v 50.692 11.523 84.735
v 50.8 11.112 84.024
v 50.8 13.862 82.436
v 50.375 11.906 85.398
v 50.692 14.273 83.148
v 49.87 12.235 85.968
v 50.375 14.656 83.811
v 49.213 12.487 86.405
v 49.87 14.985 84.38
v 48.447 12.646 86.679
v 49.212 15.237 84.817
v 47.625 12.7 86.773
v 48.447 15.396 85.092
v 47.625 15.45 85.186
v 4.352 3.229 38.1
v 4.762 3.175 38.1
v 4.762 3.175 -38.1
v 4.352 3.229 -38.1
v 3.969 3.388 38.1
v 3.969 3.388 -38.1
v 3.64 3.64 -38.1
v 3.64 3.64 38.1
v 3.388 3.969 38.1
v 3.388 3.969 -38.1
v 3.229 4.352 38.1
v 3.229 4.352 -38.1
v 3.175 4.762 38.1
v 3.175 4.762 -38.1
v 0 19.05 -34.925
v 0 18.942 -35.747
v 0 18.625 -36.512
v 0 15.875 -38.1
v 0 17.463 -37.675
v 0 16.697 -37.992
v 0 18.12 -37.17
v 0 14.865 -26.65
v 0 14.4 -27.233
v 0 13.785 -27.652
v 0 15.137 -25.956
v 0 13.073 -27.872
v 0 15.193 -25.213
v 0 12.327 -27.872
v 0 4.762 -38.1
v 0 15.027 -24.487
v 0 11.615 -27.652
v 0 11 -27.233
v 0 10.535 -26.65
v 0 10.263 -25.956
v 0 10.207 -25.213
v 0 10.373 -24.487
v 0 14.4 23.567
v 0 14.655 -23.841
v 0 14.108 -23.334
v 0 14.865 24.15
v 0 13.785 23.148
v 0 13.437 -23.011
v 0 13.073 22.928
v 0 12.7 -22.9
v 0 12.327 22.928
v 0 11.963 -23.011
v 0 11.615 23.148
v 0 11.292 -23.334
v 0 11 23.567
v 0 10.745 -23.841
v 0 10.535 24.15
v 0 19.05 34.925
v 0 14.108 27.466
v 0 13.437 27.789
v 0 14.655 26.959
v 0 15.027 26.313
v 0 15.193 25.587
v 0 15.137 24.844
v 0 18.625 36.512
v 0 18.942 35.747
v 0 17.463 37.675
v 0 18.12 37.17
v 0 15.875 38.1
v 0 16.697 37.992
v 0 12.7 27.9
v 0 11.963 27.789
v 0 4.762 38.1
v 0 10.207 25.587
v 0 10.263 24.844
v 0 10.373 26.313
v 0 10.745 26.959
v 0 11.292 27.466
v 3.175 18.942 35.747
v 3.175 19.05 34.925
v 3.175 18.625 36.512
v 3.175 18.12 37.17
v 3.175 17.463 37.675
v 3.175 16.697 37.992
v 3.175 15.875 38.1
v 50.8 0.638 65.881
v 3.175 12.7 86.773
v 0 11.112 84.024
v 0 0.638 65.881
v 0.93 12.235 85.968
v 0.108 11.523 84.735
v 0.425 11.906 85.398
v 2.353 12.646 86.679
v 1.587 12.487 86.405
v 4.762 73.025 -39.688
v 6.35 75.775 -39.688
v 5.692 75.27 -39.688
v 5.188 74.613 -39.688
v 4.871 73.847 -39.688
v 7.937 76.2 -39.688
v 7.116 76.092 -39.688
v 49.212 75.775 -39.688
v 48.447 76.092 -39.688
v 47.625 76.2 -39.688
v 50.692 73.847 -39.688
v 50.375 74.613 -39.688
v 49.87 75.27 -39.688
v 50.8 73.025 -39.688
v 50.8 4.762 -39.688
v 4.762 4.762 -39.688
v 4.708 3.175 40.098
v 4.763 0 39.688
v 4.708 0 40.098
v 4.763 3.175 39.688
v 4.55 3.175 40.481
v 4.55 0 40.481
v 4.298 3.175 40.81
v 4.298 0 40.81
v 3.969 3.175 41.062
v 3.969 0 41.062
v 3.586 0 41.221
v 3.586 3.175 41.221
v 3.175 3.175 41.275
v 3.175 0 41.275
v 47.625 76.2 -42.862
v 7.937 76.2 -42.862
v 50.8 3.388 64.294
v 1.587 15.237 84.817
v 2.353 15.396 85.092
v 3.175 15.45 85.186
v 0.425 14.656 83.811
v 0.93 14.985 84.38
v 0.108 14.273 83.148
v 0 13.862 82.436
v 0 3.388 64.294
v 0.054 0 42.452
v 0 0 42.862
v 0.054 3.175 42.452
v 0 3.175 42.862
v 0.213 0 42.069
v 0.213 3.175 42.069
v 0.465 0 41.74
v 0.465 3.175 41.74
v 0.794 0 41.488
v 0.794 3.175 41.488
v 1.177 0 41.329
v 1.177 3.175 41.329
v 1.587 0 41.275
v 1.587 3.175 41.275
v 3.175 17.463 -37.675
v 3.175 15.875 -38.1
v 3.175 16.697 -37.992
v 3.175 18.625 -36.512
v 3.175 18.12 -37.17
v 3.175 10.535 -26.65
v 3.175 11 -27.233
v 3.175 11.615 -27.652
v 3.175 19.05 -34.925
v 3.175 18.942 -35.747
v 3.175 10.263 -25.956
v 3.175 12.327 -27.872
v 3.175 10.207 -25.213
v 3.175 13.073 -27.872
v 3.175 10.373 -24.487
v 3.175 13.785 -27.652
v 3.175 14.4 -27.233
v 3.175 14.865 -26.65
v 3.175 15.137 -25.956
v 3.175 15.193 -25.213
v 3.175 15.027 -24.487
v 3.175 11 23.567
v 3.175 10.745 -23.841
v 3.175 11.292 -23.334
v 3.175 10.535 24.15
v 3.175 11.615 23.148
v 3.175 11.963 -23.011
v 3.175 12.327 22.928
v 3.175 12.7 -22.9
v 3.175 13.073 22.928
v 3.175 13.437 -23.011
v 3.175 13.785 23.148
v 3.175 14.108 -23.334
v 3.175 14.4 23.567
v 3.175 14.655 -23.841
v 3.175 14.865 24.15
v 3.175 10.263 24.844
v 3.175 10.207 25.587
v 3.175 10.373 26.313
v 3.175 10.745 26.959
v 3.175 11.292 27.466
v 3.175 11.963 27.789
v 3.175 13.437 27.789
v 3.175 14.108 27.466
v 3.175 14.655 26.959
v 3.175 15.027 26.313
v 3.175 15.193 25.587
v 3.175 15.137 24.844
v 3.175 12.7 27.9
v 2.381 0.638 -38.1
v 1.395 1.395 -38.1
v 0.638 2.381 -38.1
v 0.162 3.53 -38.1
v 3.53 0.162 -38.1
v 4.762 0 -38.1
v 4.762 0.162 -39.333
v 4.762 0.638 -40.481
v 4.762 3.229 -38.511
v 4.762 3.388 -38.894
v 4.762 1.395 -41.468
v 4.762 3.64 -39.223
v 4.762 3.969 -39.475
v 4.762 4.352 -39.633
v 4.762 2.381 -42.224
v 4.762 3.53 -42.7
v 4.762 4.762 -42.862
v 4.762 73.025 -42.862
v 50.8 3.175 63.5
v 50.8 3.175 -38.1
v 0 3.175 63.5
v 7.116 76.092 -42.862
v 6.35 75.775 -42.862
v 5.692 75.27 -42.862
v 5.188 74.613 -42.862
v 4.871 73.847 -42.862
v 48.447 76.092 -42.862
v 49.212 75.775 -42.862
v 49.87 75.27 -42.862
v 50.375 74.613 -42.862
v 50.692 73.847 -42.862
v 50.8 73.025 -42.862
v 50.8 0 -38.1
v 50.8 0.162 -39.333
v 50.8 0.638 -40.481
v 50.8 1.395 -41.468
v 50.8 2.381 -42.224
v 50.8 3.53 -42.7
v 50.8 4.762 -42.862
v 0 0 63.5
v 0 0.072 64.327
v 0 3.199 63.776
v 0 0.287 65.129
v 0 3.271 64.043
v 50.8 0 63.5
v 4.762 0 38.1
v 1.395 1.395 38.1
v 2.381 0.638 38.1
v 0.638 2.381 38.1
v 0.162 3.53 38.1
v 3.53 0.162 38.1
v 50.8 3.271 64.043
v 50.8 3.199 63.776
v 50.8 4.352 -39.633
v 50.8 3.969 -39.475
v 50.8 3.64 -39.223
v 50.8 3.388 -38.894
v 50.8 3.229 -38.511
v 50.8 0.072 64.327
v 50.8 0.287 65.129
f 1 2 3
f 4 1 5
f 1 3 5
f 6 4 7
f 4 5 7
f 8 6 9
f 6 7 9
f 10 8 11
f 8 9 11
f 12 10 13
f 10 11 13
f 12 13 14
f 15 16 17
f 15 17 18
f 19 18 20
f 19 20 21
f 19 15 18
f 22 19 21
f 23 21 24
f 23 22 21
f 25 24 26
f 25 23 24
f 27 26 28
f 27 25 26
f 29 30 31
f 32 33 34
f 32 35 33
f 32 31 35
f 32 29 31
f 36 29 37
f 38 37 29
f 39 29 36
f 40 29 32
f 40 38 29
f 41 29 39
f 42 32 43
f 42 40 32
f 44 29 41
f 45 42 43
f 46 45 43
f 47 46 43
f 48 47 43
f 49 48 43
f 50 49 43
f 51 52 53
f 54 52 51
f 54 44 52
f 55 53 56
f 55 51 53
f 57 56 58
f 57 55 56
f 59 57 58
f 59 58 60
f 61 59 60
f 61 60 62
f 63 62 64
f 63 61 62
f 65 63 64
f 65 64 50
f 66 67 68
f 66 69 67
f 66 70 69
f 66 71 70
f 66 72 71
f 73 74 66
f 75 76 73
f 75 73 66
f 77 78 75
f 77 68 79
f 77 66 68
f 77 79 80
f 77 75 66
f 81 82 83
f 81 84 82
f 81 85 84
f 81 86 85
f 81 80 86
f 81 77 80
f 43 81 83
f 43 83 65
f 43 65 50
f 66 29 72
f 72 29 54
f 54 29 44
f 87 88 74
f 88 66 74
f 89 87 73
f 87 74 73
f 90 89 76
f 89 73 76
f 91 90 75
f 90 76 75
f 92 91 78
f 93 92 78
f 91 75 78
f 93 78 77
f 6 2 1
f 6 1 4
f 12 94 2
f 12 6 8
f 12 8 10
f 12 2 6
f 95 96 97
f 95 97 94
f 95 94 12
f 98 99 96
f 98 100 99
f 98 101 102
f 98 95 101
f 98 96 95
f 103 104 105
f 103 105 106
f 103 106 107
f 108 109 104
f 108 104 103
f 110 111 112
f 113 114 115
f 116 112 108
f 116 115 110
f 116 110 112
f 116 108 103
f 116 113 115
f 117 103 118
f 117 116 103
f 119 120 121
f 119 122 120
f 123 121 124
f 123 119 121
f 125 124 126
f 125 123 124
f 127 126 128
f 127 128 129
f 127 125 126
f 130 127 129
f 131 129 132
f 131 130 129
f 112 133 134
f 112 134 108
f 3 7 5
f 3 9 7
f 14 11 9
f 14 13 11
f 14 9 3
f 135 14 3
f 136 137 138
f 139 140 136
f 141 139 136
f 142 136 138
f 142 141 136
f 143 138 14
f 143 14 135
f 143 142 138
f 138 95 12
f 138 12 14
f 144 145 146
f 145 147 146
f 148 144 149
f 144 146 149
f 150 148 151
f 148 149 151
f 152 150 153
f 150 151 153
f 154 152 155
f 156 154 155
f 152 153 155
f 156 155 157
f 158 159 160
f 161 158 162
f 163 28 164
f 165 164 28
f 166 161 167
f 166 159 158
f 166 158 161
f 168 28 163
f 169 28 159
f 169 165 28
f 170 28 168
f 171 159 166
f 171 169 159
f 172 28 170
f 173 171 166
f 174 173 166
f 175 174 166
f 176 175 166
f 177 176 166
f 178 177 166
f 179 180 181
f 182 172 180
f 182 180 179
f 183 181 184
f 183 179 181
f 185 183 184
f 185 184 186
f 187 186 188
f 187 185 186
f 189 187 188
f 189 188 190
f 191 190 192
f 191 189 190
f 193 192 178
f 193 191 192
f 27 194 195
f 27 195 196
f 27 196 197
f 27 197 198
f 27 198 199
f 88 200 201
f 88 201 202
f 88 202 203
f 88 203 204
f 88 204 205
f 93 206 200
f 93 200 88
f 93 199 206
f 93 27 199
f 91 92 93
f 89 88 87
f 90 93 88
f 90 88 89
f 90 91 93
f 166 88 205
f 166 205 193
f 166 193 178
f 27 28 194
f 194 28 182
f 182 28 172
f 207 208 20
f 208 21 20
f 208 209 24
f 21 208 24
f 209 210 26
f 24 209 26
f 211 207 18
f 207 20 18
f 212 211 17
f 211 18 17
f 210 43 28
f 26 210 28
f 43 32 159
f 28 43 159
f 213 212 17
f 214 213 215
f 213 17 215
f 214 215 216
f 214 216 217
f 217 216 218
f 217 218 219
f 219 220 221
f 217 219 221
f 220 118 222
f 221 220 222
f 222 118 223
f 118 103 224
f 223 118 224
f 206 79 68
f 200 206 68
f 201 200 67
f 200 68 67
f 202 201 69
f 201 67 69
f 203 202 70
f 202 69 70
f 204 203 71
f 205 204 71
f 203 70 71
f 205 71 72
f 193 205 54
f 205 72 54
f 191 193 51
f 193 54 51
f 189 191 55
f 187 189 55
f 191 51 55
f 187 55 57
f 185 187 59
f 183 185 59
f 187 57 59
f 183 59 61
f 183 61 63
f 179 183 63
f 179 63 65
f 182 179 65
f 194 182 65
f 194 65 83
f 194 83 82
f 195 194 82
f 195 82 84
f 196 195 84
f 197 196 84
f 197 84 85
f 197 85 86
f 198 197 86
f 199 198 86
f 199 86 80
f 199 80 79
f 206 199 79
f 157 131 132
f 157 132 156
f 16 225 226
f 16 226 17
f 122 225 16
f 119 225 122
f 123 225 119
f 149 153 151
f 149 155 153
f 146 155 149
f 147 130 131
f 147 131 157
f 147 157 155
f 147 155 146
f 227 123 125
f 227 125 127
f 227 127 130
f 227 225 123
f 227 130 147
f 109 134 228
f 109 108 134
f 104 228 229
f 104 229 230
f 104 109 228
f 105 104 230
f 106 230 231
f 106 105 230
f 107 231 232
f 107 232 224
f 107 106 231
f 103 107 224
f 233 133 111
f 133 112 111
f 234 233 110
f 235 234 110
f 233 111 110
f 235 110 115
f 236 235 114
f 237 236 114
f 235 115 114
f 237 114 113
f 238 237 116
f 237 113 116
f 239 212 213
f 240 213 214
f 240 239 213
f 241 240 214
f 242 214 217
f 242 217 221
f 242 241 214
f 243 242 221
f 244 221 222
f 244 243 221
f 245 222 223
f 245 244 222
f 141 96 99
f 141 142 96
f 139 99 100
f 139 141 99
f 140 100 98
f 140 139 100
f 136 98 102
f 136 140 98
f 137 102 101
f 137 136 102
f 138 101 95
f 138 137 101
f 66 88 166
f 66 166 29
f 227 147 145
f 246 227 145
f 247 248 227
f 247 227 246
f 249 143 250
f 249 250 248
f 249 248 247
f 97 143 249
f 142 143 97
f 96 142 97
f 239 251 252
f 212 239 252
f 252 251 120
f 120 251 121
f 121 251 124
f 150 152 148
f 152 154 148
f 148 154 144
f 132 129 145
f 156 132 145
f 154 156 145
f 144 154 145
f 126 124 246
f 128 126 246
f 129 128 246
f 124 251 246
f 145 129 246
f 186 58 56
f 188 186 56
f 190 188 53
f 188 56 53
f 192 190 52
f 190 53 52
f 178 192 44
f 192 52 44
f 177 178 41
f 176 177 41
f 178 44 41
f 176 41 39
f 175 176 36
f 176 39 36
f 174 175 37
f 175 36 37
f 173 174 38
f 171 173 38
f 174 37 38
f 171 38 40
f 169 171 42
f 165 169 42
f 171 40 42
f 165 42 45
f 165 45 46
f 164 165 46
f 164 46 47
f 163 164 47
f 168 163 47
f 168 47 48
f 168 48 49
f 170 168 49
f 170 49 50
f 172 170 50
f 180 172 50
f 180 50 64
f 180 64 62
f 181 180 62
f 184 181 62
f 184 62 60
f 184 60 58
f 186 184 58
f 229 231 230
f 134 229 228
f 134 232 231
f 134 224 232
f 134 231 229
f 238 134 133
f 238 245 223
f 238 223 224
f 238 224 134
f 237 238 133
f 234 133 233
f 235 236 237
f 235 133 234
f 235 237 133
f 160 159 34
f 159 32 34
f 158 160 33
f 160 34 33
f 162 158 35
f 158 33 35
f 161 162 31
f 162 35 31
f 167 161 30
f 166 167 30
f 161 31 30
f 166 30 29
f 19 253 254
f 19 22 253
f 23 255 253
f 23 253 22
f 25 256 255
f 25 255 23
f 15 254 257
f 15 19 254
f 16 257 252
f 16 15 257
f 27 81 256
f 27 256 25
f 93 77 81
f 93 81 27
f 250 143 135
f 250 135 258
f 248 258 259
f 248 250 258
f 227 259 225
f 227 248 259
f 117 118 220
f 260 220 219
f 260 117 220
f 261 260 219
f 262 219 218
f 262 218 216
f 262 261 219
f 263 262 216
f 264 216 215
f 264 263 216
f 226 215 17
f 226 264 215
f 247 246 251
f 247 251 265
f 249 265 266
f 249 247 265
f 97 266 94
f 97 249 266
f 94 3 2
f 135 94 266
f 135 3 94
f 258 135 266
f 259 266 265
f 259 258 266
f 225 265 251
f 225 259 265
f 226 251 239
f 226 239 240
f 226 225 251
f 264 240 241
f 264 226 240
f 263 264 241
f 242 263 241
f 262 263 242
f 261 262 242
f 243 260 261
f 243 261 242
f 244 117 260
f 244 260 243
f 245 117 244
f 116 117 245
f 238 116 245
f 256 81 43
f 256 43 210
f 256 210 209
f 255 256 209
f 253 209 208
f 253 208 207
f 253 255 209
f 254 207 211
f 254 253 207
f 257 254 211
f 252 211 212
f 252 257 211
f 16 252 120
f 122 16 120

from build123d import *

# Parameters (mm, degrees)
BASE_FLANGE1_DEPTH    = 38.1
TAB1_DEPTH            = 3.175
EDGE_FLANGE1_DEPTH    = 50.8
FILLET2_R             = 1.5875
M6X1_0_TAPPED_HOLE1_D = 5
EDGE_FLANGE2_DEPTH    = 46.0375
FILLET1_R             = 3.175


# Sheet-metal steps are written as plain solids
with BuildPart() as part:
    # Sketch1 → Base-Flange1 (new, symmetric)
    with BuildSketch(Plane.XY):
        with BuildLine():
            Line((0, 19.05), (0, 4.7625))
            ThreePointArc((0, 4.7625), (1.394903955, 1.394903955), (4.7625, 0))
            Line((4.7625, 0), (50.8, 0))
            Line((50.8, 0), (50.8, 3.175))
            Line((50.8, 3.175), (4.7625, 3.175))
            ThreePointArc((4.7625, 3.175), (3.639967985, 3.639967985), (3.175, 4.7625))
            Line((3.175, 4.7625), (3.175, 19.05))
            Line((3.175, 19.05), (0, 19.05))
        make_face()
    extrude(amount=BASE_FLANGE1_DEPTH, both=True)

    # Sketch2 → Tab1 (add)
    with BuildSketch(Plane.XZ):
        Polygon((50.8, 38.1), (4.7625, 38.1), (4.7625, 41.275), (0, 41.275), (0, 63.5), (50.8, 63.5), align=None)
    extrude(amount=-TAB1_DEPTH)

    # Edge-Flange1 section (across the edge) → Edge-Flange1 (add)
    with BuildSketch(Plane(origin=(0, 3.175, 63.925369343), x_dir=(0, 0.8660254037844416, -0.49999999999999495), z_dir=(1, 0, 0))):
        with BuildLine():
            Line((-3.175, 0.425369343), (-3.175, 24.549261314))
            Line((-3.175, 24.549261314), (0, 24.549261314))
            Line((0, 24.549261314), (0, 0.425369343))
            ThreePointArc((0, 0.425369343), (0.054092751, 0.014494109), (0.212684671, -0.368380657))
            Line((0.212684671, -0.368380657), (-2.536945986, -1.955880657))
            ThreePointArc((-2.536945986, -1.955880657), (-3.012721748, -0.807256359), (-3.175, 0.425369343))
        make_face()
    extrude(amount=EDGE_FLANGE1_DEPTH)

    # Fillet2
    fillet2_edges = [part.edges().sort_by_distance(p)[0] for p in [
        (4.7625, 1.5875, 41.275),
        (0, 1.5875, 41.275),
    ]]
    fillet(fillet2_edges, radius=FILLET2_R)

    # M6x1.0 Tapped Hole1 (through all)
    with Locations(Plane(origin=(3.175, 0, 0), x_dir=(0, 0, -1), z_dir=(1, 0, 0))):
        with Locations((-25.4, 12.7), (25.4, 12.7)):
            Hole(M6X1_0_TAPPED_HOLE1_D / 2)

    # Edge-Flange2 section (across the edge) → Edge-Flange2 (add)
    with BuildSketch(Plane(origin=(50.8, 3.175, -39.6875), x_dir=(0, 0, 1), z_dir=(-1, 0, 0))):
        with BuildLine():
            Line((-3.175, 1.5875), (-3.175, 73.025))
            Line((-3.175, 73.025), (0, 73.025))
            Line((0, 73.025), (0, 1.5875))
            ThreePointArc((0, 1.5875), (0.464967985, 0.464967985), (1.5875, 0))
            Line((1.5875, 0), (1.5875, -3.175))
            ThreePointArc((1.5875, -3.175), (-1.780096045, -1.780096045), (-3.175, 1.5875))
        make_face()
    extrude(amount=EDGE_FLANGE2_DEPTH)

    # Fillet1
    fillet1_edges = [part.edges().sort_by_distance(p)[0] for p in [
        (4.7625, 76.2, -41.275),
        (1.5875, 19.05, 38.1),
        (0, 14.074815329, 85.979403285),
        (50.8, 14.074815329, 85.979403285),
        (1.5875, 19.05, -38.1),
        (50.8, 76.2, -41.275),
    ]]
    fillet(fillet1_edges, radius=FILLET1_R)


solid = part.part
